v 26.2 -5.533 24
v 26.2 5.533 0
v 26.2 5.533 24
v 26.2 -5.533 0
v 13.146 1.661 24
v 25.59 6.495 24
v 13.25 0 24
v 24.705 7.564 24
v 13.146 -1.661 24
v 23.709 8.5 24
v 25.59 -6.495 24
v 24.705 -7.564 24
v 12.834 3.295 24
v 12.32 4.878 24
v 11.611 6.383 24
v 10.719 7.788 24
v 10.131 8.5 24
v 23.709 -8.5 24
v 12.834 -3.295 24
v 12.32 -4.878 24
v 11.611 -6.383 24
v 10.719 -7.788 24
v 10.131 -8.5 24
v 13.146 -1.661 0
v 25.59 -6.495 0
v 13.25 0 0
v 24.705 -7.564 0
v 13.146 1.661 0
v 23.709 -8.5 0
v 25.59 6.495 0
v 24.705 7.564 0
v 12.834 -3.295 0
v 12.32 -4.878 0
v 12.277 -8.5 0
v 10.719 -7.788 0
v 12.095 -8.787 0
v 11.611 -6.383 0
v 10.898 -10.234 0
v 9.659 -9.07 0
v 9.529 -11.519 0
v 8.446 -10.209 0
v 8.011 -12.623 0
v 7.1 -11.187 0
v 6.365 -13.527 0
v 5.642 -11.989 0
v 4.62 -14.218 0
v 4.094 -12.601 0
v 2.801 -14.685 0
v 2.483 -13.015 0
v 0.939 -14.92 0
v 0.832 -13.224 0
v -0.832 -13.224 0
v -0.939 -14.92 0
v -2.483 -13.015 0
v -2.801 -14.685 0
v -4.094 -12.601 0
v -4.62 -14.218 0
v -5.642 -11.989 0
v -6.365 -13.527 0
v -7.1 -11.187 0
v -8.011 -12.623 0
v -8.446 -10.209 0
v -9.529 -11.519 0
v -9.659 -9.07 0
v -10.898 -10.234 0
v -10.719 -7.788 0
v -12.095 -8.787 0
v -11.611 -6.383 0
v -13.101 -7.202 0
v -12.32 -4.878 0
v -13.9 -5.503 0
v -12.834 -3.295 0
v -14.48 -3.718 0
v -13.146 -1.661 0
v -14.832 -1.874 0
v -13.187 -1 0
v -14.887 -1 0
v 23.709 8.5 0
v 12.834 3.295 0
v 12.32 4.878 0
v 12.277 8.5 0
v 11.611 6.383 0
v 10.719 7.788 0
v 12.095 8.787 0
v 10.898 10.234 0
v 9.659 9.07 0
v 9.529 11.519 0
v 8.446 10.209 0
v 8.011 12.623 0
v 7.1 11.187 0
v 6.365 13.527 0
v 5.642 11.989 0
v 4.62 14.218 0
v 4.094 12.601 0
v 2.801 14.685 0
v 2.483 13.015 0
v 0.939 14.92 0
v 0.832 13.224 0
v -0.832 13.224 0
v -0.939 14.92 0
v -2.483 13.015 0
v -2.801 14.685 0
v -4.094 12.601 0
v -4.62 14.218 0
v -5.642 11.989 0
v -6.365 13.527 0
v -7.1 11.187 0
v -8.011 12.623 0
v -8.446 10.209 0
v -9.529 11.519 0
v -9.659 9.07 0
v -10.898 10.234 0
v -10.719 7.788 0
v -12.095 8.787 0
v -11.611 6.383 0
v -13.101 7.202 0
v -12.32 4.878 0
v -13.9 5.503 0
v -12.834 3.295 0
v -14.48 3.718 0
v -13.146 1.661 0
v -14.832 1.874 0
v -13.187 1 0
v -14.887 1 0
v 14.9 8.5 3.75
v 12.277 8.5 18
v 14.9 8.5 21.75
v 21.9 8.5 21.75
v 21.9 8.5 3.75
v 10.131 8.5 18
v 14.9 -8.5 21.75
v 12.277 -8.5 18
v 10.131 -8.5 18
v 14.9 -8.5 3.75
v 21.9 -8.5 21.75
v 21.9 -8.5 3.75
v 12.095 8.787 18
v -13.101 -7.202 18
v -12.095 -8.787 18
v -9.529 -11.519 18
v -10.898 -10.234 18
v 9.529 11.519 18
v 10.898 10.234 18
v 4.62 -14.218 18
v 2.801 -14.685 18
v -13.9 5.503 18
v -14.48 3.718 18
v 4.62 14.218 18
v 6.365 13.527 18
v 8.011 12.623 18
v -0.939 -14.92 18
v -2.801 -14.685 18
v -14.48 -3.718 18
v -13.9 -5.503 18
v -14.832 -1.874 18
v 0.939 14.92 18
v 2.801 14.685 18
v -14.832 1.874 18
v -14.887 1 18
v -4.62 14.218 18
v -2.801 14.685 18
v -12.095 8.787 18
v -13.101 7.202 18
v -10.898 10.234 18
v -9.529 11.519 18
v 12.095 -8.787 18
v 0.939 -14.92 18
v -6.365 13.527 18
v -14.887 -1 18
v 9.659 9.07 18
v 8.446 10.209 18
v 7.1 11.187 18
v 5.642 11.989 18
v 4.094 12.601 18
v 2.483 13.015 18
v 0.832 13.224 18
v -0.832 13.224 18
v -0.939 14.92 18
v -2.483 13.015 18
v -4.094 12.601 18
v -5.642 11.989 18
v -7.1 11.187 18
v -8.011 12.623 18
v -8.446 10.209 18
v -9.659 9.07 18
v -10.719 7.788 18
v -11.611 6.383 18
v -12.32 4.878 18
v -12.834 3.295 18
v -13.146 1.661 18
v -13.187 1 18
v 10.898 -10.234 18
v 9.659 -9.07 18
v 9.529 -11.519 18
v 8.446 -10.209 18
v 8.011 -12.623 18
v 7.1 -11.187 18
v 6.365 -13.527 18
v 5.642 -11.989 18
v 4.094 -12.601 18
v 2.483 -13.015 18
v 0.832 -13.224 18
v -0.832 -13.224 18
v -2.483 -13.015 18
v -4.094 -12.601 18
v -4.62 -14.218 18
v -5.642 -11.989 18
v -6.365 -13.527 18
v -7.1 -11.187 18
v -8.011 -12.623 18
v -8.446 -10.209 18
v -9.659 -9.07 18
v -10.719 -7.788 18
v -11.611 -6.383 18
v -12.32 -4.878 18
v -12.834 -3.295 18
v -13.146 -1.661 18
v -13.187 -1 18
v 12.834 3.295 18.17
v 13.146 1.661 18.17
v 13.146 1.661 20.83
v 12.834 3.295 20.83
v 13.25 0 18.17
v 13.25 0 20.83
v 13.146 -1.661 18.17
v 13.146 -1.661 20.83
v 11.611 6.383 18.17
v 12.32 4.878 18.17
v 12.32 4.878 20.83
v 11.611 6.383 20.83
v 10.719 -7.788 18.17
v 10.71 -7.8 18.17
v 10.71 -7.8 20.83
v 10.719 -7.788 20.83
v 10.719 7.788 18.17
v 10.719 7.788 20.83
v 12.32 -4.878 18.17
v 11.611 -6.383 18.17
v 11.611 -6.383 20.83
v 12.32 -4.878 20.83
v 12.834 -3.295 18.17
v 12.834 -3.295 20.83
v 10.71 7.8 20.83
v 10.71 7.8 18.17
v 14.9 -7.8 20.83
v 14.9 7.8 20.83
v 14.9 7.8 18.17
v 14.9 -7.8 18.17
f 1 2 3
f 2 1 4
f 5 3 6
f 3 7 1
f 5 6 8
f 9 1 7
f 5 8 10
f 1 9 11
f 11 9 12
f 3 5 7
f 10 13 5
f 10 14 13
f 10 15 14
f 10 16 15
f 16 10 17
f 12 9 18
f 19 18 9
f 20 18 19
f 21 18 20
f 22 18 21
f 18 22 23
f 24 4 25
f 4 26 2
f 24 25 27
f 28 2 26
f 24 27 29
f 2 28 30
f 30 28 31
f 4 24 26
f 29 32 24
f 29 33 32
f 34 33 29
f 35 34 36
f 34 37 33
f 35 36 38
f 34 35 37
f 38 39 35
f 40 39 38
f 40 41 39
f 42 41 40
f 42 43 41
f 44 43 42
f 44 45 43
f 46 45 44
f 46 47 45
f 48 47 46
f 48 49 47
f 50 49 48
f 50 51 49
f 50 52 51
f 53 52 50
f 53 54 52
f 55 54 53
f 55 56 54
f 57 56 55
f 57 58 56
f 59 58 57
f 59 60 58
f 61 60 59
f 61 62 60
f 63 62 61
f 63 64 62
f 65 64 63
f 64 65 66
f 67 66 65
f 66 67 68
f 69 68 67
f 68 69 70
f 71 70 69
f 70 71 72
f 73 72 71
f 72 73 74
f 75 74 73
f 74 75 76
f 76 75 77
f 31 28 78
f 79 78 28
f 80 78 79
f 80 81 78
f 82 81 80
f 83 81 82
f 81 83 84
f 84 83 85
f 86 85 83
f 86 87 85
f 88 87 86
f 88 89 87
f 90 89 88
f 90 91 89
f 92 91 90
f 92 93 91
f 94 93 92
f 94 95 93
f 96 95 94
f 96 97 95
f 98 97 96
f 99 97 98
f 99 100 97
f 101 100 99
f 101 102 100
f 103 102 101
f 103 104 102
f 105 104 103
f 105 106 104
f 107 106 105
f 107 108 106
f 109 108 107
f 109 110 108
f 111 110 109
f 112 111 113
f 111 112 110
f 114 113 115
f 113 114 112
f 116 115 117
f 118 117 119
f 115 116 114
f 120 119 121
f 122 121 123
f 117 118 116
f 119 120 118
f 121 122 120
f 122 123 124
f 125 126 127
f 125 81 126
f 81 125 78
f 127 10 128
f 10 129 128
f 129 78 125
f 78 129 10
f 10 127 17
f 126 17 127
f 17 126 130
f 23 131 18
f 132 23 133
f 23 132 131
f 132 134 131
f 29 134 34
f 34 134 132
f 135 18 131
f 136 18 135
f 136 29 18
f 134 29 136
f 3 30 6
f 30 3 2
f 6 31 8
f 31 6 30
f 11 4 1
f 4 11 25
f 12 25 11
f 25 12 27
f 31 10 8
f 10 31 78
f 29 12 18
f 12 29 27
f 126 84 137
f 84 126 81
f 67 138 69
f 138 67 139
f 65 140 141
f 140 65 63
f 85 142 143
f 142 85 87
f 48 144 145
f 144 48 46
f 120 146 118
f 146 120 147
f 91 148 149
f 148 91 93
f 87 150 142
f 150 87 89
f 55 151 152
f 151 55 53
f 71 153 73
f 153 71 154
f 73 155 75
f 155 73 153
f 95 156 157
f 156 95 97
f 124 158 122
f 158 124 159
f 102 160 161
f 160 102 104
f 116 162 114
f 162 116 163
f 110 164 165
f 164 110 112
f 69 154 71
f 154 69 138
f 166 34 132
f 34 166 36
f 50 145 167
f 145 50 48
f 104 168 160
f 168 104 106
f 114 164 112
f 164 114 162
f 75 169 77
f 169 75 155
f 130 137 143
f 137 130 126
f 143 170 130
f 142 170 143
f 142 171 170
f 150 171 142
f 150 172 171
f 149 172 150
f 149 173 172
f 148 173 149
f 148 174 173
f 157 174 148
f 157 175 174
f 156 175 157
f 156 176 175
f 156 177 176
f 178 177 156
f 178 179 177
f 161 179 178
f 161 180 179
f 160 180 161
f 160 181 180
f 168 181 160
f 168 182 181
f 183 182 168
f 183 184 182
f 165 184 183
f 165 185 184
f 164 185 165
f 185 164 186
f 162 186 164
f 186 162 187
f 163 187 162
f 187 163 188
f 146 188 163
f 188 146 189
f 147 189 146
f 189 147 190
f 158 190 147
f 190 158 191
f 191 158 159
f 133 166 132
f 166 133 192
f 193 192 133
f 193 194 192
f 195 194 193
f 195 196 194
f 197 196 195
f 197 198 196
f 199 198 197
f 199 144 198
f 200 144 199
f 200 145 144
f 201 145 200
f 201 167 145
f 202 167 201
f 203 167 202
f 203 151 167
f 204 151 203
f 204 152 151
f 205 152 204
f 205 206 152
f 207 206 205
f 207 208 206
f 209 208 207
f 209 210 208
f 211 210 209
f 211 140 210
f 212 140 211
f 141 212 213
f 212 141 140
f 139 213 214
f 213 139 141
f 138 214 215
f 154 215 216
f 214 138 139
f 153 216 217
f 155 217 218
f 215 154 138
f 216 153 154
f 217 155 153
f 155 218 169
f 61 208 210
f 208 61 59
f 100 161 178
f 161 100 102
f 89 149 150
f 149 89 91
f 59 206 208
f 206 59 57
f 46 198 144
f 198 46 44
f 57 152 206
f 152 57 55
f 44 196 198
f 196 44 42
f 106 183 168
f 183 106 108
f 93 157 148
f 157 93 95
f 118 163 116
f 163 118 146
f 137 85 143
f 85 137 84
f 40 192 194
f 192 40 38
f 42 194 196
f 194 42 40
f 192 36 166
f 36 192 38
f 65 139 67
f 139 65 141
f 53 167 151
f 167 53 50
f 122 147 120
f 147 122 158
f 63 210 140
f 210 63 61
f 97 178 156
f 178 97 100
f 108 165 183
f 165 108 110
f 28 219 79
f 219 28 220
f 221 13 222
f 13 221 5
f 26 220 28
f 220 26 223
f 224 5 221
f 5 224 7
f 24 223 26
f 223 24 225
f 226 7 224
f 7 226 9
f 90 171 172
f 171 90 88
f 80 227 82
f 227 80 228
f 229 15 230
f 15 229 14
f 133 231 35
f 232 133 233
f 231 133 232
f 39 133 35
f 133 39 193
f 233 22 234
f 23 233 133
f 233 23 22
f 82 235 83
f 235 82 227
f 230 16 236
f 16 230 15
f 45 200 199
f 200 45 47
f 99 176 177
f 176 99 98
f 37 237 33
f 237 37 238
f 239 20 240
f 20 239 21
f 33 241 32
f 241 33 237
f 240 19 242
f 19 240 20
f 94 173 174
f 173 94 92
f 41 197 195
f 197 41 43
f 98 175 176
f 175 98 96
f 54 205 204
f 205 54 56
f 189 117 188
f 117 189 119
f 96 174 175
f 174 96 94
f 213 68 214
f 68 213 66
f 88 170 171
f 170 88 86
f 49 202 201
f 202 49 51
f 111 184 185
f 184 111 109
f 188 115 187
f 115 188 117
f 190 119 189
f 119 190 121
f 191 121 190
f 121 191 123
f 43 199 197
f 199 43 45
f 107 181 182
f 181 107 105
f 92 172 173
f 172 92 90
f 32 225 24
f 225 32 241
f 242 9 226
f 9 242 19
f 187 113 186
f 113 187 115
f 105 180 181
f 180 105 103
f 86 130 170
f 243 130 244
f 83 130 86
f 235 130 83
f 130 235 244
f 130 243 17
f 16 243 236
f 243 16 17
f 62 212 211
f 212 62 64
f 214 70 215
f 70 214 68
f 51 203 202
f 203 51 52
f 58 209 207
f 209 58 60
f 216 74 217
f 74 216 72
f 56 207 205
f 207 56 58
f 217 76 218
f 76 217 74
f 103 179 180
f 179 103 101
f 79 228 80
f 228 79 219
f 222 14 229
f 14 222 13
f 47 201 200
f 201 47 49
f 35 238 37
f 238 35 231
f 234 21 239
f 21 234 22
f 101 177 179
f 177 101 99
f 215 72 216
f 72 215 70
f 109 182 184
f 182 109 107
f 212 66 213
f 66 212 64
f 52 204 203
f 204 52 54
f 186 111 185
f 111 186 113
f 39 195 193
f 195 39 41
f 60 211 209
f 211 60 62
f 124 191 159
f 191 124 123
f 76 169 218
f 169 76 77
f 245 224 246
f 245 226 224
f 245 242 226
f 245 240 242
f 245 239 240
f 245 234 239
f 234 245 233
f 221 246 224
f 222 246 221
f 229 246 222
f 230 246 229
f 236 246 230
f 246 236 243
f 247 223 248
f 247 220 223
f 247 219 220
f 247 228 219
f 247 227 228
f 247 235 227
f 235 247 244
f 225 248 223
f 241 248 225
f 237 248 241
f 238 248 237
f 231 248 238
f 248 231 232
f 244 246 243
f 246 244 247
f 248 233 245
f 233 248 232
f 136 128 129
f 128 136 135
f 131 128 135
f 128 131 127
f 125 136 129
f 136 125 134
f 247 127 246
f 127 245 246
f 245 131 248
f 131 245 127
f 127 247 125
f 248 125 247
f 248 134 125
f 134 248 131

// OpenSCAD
/*
    Author: Daniel Devine
    Date: 19/02/17
    Description: Snorkel clip for snorkels with a round tube. Requires cutting out two small support pillars in order to be able to get the straps into the strap clip. Existing models on Thingiverse were too weak and/or required too much support material to print.
    CC-BY-SA License - https://creativecommons.org/licenses/by-sa/2.5/
*/

snorkel_diameter = 26.5; // 27mm diameter, but we want it to clip tight.
snorkel_clip_height = 18; // Height of the clip that attaches to the snorkel tube.
strap_height = 18; // Height of the snorkel holder.
strap_clip_offset = 3; // Distance (effective thickness) of the top part of the clip. Don't be too thin!
strap_allowance = 7; // Give room for the straps to run through nicely.
holder_wall_thickness = 3.4; // Thicker = less flex, more friction.
strap_clip_width = 17;
strap_entrance_scale = 0.38; // How narrow the slot that the strap will need to squeeze through is in relation to strap_allowance. Should be a bit less than half.

clip();

module clip(){
    _uncenter = snorkel_clip_height/2;

    difference(){
        union(){
            difference(){
                union(){
                    translate([0, 0, _uncenter])
                        cylinder(snorkel_clip_height, d=(snorkel_diameter + holder_wall_thickness), center=true, $fn=50); // Snorkel clip
                    intersection(){
                        translate([(snorkel_diameter/2)+holder_wall_thickness, 0, _uncenter + strap_clip_offset])
                            cube(size=[14+(holder_wall_thickness*1.5),strap_clip_width,strap_height+(strap_clip_offset*2)], center=true); // strap clip
                    translate([(snorkel_diameter/2)+holder_wall_thickness, 0, _uncenter+ strap_clip_offset])
                        cylinder(h=strap_height+(strap_clip_offset*2), d=strap_clip_width*1.3, center=true, $fn=50); // clip reinforcing
                    } 
                }
     
                translate([0, 0, _uncenter])
                    cylinder(h=snorkel_clip_height*4, d=snorkel_diameter, center=true, $fn=50); // snorkel hole
                translate([0-((snorkel_diameter/2)+holder_wall_thickness)+0.5, 0, _uncenter])
                    cube(size=[holder_wall_thickness*2,2, snorkel_clip_height+1], center=true); // Snorkel clip expansion gap
            }
        }

        translate([0, 0, _uncenter])
        union(){
            translate([(snorkel_diameter/2) - 2, 0 , (snorkel_clip_height/2)+(strap_clip_offset/2)])
                // purposefully strap_clip_width -2 so that two little pillars form as support. Factor of 0.38 on the strap entrance hole - possibly too tight?
                cube([strap_allowance+5, strap_clip_width-1.4, (strap_allowance*strap_entrance_scale)], center=true);// strap-hole entrance
            translate([(snorkel_diameter/2)+holder_wall_thickness+1.75, 0, strap_clip_offset * 1.25 ])
                cube([strap_allowance, strap_clip_width+4, strap_height], center=true);// strap hole
        }
    }
}
